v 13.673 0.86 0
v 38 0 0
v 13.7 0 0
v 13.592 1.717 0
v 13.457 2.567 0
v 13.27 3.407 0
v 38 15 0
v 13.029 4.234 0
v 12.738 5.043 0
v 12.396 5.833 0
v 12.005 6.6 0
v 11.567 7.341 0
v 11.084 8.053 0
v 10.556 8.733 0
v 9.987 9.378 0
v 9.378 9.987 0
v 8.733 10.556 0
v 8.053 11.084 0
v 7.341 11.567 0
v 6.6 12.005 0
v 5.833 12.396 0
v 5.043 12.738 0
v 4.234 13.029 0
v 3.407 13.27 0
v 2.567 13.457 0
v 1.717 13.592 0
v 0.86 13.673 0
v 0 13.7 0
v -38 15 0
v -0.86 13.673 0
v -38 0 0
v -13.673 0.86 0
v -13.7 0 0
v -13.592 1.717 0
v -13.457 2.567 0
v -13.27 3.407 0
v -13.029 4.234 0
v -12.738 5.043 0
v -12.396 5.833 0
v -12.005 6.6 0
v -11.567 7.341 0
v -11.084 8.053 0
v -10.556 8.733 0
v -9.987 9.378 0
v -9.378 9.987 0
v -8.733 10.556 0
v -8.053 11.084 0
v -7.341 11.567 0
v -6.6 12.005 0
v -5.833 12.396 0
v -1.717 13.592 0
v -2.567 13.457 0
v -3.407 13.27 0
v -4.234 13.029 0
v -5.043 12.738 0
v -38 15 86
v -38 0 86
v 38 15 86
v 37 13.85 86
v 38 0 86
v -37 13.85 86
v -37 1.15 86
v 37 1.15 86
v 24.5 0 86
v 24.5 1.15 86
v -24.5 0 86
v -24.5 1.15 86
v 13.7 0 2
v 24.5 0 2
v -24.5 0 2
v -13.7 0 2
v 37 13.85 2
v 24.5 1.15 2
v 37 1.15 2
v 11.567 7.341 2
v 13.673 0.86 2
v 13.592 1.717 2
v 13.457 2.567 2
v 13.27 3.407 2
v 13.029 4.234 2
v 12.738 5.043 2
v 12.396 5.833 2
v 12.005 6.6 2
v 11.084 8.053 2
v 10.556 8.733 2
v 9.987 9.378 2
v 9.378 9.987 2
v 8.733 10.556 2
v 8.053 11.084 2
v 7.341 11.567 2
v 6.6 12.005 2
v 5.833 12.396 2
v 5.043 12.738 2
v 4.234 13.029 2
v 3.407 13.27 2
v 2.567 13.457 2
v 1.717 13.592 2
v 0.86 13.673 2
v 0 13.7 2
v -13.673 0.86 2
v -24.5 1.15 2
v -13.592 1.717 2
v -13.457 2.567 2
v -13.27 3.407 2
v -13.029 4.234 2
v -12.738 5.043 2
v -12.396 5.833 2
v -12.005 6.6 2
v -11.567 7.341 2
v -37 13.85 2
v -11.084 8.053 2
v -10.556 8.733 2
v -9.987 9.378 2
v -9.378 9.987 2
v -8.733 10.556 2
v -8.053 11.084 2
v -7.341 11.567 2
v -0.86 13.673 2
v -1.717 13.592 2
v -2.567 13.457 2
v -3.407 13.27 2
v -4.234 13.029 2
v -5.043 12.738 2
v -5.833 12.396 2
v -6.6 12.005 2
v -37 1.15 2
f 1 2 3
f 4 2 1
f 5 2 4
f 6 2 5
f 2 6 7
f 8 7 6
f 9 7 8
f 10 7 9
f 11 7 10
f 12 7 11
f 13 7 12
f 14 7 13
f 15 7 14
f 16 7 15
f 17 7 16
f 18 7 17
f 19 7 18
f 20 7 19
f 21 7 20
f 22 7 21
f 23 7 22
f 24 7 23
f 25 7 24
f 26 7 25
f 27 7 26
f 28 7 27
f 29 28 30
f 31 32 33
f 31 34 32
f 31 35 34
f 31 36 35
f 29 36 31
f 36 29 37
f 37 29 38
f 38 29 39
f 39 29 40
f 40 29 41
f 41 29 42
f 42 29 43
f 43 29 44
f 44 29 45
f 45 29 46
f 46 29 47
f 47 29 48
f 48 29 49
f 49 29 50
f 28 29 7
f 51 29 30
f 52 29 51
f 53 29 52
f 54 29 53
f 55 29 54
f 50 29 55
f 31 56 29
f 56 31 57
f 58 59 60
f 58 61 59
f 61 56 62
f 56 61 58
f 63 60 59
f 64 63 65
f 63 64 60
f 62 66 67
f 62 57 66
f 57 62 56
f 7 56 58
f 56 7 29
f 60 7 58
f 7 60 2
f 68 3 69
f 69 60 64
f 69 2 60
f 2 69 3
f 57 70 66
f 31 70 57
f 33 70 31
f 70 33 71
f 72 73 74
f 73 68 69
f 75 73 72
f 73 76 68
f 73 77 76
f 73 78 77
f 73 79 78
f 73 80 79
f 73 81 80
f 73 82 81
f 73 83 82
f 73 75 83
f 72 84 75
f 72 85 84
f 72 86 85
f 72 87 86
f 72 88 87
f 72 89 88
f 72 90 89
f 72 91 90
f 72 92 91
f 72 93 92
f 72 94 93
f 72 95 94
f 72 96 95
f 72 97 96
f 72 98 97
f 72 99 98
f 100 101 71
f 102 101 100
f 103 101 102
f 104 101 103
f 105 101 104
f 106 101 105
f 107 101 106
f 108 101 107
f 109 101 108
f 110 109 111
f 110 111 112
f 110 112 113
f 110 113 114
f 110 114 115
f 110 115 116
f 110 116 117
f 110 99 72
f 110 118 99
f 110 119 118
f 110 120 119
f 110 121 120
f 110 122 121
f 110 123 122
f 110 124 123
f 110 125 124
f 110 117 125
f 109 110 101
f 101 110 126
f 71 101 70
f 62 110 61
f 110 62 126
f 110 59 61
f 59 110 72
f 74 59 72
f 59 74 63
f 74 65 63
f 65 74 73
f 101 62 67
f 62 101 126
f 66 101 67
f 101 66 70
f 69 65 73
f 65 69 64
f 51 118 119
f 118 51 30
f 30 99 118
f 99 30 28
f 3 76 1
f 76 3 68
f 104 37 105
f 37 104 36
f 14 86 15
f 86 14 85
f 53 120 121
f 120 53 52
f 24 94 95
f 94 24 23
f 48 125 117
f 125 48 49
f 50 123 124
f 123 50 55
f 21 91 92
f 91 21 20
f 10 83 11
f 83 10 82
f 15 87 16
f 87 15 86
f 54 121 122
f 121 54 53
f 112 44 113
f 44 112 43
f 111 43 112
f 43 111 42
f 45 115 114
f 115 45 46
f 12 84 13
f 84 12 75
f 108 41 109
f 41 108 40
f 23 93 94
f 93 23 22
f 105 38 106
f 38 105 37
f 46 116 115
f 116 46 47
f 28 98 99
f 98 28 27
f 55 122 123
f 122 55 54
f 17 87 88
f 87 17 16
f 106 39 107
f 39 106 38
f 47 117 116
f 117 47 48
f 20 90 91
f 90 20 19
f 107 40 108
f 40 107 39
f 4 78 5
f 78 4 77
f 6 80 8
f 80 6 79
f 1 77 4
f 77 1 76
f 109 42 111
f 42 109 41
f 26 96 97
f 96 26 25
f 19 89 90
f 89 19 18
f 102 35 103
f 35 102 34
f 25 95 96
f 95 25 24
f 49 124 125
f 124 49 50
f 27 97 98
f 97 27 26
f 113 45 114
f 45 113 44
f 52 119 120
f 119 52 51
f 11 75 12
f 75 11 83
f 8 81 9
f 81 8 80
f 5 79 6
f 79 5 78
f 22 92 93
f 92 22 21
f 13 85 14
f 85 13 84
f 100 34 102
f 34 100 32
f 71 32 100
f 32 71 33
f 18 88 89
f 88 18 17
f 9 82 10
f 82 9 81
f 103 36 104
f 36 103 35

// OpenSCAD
echo(version=version());

// Nerf quickload for 6 shot magazine.

difference() {
    color("red")
    translate([0, 7.5, 0])
        linear_extrude(height = 86)
            square([76, 15], center = true);
	translate([0, 7.5, 2])
        linear_extrude(height = 86)
            square([74, 12.7], center = true);
    translate([0, 0, 2])
        linear_extrude(height = 86)
            square([49, 3], center = true);
    translate([0, 0, 0])
        rotate ([0,0,90]) cylinder (h = 5, r=13.7, center = true, $fn=100);

}            
